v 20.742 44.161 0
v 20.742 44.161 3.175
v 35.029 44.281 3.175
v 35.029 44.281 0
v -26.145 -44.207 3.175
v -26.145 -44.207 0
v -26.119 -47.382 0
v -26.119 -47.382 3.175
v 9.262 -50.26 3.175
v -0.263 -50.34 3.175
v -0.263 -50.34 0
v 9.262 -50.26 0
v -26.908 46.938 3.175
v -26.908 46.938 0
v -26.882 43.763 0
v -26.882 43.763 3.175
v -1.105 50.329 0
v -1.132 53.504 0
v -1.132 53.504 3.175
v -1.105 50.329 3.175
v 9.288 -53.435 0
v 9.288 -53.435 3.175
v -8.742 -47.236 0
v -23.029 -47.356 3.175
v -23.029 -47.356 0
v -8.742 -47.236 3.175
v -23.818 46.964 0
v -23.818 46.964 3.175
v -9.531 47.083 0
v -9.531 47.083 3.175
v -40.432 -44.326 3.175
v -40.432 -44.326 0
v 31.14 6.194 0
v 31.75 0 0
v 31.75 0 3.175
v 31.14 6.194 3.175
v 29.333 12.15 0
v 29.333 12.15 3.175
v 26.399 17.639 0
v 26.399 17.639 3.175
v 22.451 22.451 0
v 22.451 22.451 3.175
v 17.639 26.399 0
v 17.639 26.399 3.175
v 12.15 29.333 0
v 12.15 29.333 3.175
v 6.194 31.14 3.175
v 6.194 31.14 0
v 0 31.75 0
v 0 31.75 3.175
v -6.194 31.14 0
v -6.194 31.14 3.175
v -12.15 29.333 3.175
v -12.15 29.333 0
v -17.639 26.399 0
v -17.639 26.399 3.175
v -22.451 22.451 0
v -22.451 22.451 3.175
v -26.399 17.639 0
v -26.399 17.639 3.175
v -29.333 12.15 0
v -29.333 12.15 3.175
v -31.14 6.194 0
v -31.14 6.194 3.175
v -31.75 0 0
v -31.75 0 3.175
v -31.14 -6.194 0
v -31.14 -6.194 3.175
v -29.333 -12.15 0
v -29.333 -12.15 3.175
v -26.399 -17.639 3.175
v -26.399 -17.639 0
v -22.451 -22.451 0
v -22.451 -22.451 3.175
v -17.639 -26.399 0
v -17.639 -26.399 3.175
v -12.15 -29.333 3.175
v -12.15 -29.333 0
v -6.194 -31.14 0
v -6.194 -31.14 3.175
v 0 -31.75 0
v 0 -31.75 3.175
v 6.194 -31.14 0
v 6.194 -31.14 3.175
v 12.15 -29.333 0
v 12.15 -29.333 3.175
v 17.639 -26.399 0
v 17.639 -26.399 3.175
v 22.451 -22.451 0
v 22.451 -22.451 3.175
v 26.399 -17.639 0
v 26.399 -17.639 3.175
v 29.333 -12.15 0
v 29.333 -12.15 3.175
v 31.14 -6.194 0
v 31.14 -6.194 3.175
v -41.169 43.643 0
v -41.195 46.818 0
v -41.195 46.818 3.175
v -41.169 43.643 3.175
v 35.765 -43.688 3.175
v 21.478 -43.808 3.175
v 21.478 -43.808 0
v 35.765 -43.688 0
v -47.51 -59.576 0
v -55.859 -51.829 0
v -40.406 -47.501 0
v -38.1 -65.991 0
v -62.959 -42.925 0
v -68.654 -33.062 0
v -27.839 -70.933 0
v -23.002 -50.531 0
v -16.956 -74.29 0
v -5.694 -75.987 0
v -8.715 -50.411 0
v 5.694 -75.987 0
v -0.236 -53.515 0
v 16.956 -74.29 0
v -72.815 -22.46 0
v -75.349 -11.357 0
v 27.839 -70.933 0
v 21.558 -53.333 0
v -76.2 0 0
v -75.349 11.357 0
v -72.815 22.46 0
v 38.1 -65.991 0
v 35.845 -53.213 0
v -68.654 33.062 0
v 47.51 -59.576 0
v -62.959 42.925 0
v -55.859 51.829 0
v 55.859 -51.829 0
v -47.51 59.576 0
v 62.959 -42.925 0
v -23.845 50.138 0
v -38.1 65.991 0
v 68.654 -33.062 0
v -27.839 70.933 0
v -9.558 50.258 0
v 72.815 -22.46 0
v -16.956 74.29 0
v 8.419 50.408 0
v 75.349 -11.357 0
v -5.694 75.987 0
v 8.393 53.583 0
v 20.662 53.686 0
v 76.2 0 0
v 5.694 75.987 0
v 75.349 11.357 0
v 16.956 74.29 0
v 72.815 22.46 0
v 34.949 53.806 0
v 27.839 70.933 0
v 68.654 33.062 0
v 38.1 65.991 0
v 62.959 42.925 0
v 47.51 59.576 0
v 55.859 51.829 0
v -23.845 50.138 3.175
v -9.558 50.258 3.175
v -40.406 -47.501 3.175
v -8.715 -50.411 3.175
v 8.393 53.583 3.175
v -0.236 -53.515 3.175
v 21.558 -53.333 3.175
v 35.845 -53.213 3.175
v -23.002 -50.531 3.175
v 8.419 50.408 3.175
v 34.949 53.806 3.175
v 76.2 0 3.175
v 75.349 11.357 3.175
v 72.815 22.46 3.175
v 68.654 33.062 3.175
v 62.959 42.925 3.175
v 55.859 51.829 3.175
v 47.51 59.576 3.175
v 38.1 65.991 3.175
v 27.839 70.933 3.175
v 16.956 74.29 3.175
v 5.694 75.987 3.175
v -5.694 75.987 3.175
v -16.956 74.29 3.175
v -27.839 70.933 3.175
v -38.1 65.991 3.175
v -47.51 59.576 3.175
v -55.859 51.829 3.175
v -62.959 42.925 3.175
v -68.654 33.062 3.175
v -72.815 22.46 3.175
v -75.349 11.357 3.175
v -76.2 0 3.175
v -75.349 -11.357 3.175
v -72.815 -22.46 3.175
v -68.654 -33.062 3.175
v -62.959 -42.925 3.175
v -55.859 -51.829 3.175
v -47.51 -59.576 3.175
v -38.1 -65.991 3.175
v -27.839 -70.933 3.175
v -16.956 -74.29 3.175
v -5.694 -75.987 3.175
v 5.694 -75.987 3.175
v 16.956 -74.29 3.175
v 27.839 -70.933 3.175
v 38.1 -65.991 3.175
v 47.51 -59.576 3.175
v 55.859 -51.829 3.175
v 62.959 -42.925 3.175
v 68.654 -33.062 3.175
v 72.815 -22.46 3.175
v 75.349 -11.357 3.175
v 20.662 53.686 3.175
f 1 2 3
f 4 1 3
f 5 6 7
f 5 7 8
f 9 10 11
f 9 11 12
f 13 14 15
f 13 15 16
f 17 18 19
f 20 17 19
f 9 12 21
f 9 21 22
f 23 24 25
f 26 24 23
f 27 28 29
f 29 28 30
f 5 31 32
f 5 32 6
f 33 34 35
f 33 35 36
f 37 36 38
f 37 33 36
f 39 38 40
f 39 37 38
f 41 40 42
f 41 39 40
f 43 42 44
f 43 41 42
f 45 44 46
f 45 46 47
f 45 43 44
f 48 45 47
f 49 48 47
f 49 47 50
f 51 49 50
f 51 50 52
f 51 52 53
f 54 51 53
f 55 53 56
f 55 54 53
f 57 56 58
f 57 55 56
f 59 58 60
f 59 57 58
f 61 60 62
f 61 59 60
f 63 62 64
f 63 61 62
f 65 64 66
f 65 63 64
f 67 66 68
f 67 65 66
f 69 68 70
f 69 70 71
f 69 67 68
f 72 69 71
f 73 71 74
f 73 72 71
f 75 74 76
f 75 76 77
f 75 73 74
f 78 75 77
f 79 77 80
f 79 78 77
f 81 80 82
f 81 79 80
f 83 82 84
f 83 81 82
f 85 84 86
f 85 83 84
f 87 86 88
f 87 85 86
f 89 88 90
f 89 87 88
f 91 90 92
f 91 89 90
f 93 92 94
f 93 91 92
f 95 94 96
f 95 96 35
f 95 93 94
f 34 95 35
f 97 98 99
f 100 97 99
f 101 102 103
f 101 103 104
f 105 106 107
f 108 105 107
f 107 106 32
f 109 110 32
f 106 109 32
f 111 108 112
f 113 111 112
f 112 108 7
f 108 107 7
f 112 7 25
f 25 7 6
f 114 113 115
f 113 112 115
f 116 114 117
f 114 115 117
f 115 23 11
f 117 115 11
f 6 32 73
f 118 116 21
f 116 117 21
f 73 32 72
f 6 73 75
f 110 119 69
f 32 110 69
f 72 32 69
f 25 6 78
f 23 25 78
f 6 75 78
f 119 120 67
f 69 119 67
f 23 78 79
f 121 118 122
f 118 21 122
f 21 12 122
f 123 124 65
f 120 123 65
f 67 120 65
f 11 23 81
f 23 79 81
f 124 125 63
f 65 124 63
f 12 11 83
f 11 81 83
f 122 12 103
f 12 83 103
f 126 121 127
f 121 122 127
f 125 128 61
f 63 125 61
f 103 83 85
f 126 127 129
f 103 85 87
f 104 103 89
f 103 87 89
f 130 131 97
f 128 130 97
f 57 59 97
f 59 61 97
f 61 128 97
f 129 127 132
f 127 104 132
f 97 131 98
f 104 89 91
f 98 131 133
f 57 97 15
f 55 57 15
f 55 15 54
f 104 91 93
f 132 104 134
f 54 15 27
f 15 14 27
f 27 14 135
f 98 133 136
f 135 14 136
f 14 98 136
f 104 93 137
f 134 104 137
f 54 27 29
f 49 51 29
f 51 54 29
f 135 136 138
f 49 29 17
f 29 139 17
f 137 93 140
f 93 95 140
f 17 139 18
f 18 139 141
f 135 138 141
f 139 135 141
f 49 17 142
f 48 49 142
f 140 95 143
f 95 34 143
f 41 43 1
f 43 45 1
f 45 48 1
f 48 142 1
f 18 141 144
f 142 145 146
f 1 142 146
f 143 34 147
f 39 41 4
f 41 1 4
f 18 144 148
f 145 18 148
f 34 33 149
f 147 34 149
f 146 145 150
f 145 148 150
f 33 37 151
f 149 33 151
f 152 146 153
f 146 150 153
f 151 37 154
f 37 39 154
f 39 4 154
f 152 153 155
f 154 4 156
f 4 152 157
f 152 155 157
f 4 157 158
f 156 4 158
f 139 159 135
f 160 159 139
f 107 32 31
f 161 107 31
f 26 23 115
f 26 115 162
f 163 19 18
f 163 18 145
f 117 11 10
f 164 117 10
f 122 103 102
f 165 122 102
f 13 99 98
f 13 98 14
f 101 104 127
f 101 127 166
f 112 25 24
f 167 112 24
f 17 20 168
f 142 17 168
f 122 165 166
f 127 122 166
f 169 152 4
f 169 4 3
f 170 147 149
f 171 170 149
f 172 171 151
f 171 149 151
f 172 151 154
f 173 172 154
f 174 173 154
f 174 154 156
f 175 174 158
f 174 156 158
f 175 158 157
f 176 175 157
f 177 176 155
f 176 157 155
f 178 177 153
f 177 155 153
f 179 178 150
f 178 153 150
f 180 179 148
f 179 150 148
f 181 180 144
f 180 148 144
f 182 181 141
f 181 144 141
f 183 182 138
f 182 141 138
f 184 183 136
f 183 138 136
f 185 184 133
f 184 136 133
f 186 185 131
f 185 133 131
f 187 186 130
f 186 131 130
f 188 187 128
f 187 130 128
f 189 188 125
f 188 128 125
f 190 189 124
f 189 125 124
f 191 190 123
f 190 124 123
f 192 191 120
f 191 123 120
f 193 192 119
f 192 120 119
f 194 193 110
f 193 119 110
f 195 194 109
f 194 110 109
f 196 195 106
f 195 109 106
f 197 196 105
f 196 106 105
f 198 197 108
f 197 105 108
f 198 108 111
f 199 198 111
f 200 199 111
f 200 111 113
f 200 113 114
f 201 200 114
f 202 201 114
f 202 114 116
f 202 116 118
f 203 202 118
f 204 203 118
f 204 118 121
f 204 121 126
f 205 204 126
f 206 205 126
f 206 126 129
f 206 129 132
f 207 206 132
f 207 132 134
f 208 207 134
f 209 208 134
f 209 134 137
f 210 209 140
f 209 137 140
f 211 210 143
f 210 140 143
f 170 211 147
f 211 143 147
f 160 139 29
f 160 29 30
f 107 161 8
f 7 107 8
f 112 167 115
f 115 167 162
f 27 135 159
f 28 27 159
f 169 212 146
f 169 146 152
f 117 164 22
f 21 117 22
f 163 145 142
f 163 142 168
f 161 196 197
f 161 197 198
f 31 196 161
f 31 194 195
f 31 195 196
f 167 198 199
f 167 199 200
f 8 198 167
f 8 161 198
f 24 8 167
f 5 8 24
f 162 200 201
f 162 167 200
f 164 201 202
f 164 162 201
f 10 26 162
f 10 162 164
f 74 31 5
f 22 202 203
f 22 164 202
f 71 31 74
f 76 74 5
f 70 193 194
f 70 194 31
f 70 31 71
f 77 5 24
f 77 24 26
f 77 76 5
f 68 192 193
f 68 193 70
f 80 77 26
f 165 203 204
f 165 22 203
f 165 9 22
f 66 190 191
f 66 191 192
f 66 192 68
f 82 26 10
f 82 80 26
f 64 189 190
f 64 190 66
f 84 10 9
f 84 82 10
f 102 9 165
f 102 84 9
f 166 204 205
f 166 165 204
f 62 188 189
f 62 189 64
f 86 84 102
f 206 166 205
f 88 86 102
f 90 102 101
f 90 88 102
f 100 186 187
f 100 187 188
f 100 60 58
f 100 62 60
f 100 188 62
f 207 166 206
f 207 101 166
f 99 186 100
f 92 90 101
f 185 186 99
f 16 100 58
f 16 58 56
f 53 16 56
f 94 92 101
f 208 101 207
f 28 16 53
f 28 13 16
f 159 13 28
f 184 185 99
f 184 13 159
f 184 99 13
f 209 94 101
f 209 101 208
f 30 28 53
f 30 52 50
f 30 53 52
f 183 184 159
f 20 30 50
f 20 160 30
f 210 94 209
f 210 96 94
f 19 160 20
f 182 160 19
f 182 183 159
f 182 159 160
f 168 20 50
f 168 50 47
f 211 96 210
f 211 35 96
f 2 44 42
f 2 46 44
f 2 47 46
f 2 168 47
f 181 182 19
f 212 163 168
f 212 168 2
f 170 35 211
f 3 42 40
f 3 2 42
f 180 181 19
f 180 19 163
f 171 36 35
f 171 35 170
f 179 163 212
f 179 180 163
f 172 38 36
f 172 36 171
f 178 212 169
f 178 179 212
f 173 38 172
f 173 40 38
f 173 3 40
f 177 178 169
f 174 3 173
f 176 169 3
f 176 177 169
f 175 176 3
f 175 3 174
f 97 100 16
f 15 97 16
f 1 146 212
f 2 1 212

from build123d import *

# Parameters (mm, degrees)
SKETCH1_R           = 76.2
SKETCH1_R_2         = 31.75
BOSS_EXTRUDE1_DEPTH = 3.175
CAVITY1_START       = -53.511255689
CAVITY1_OUTLINE_W   = 14.2875
CAVITY1_OUTLINE_H   = 3.175
CAVITY1_DEPTH       = 9.525
CAVITY1_START_2     = 43.986255689
CAVITY1_2_OUTLINE_W = 14.2875
CAVITY1_2_OUTLINE_H = 3.175
CAVITY1_2_DEPTH     = 9.525
CAVITY1_START_3     = -50.336255689
CAVITY1_3_OUTLINE_W = 14.2875
CAVITY1_3_OUTLINE_H = 3.175
CAVITY1_3_DEPTH     = 3.175
CAVITY1_START_4     = -47.161255689
CAVITY1_4_OUTLINE_W = 14.2875
CAVITY1_4_OUTLINE_H = 3.175
CAVITY1_4_DEPTH     = 3.175
CAVITY1_5_OUTLINE_W = 14.2875
CAVITY1_5_OUTLINE_H = 3.175
CAVITY1_5_DEPTH     = 3.175
CAVITY1_START_5     = 47.161255689
CAVITY1_6_OUTLINE_W = 14.2875
CAVITY1_6_OUTLINE_H = 3.175
CAVITY1_6_DEPTH     = 3.175
CAVITY1_7_OUTLINE_W = 9.525
CAVITY1_7_OUTLINE_H = 3.175
CAVITY1_7_DEPTH     = 3.175
CAVITY1_START_6     = 50.336255689
CAVITY1_8_OUTLINE_W = 9.525
CAVITY1_8_OUTLINE_H = 3.175
CAVITY1_8_DEPTH     = 3.175


# Read off the part's stored shape, not the designer's step: Cavity1
with BuildPart() as part:
    # Sketch1 → Boss-Extrude1 (new body)
    with BuildSketch(Plane.XY):
        Circle(SKETCH1_R)
        Circle(SKETCH1_R_2, mode=Mode.SUBTRACT)
    extrude(amount=BOSS_EXTRUDE1_DEPTH)

    # Cavity1 outline → Cavity1 (cut)
    with BuildSketch(Plane(origin=(0, 0, 0), x_dir=(0.9999649697426024, 0.008370142631770718, 0), z_dir=(0.008370142631770716, -0.9999649697426025, 0)).offset(CAVITY1_START)):
        with Locations((28.254299641, 1.5875)):
            Rectangle(CAVITY1_OUTLINE_W, CAVITY1_OUTLINE_H)
    extrude(amount=CAVITY1_DEPTH, mode=Mode.SUBTRACT)

    # Cavity1 2 outline → Cavity1 2 (cut)
    with BuildSketch(Plane(origin=(0, 0, 0), x_dir=(0.9999649697426024, 0.008370142631770718, 0), z_dir=(0.008370142631770716, -0.9999649697426025, 0)).offset(CAVITY1_START_2)):
        with Locations((28.254299641, 1.5875)):
            Rectangle(CAVITY1_2_OUTLINE_W, CAVITY1_2_OUTLINE_H)
    extrude(amount=CAVITY1_2_DEPTH, mode=Mode.SUBTRACT)

    # Cavity1 3 outline → Cavity1 3 (cut)
    with BuildSketch(Plane(origin=(0, 0, 0), x_dir=(0.9999649697426024, 0.008370142631770718, 0), z_dir=(0.008370142631770716, -0.9999649697426025, 0)).offset(CAVITY1_START_3)):
        with Locations((-16.280608677, 1.5875)):
            Rectangle(CAVITY1_3_OUTLINE_W, CAVITY1_3_OUTLINE_H)
    extrude(amount=CAVITY1_3_DEPTH, mode=Mode.SUBTRACT)

    # Cavity1 4 outline → Cavity1 4 (cut)
    with BuildSketch(Plane(origin=(0, 0, 0), x_dir=(0.9999649697426024, 0.008370142631770718, 0), z_dir=(0.008370142631770716, -0.9999649697426025, 0)).offset(CAVITY1_START_4)):
        with Locations((-33.658200359, 1.5875)):
            Rectangle(CAVITY1_4_OUTLINE_W, CAVITY1_4_OUTLINE_H)
    extrude(amount=CAVITY1_4_DEPTH, mode=Mode.SUBTRACT)

    # Cavity1 5 outline → Cavity1 5 (cut)
    with BuildSketch(Plane(origin=(0, 0, 0), x_dir=(0.9999649697426024, 0.008370142631770718, 0), z_dir=(0.008370142631770716, -0.9999649697426025, 0)).offset(CAVITY1_START_2)):
        with Locations((-33.658200359, 1.5875)):
            Rectangle(CAVITY1_5_OUTLINE_W, CAVITY1_5_OUTLINE_H)
    extrude(amount=CAVITY1_5_DEPTH, mode=Mode.SUBTRACT)

    # Cavity1 6 outline → Cavity1 6 (cut)
    with BuildSketch(Plane(origin=(0, 0, 0), x_dir=(0.9999649697426024, 0.008370142631770718, 0), z_dir=(0.008370142631770716, -0.9999649697426025, 0)).offset(CAVITY1_START_5)):
        with Locations((-16.280608677, 1.5875)):
            Rectangle(CAVITY1_6_OUTLINE_W, CAVITY1_6_OUTLINE_H)
    extrude(amount=CAVITY1_6_DEPTH, mode=Mode.SUBTRACT)

    # Cavity1 7 outline → Cavity1 7 (cut)
    with BuildSketch(Plane(origin=(0, 0, 0), x_dir=(0.9999649697426024, 0.008370142631770718, 0), z_dir=(0.008370142631770716, -0.9999649697426025, 0)).offset(CAVITY1_START)):
        with Locations((4.078332174, 1.5875)):
            Rectangle(CAVITY1_7_OUTLINE_W, CAVITY1_7_OUTLINE_H)
    extrude(amount=CAVITY1_7_DEPTH, mode=Mode.SUBTRACT)

    # Cavity1 8 outline → Cavity1 8 (cut)
    with BuildSketch(Plane(origin=(0, 0, 0), x_dir=(0.9999649697426024, 0.008370142631770718, 0), z_dir=(0.008370142631770716, -0.9999649697426025, 0)).offset(CAVITY1_START_6)):
        with Locations((4.078332174, 1.5875)):
            Rectangle(CAVITY1_8_OUTLINE_W, CAVITY1_8_OUTLINE_H)
    extrude(amount=CAVITY1_8_DEPTH, mode=Mode.SUBTRACT)


solid = part.part
